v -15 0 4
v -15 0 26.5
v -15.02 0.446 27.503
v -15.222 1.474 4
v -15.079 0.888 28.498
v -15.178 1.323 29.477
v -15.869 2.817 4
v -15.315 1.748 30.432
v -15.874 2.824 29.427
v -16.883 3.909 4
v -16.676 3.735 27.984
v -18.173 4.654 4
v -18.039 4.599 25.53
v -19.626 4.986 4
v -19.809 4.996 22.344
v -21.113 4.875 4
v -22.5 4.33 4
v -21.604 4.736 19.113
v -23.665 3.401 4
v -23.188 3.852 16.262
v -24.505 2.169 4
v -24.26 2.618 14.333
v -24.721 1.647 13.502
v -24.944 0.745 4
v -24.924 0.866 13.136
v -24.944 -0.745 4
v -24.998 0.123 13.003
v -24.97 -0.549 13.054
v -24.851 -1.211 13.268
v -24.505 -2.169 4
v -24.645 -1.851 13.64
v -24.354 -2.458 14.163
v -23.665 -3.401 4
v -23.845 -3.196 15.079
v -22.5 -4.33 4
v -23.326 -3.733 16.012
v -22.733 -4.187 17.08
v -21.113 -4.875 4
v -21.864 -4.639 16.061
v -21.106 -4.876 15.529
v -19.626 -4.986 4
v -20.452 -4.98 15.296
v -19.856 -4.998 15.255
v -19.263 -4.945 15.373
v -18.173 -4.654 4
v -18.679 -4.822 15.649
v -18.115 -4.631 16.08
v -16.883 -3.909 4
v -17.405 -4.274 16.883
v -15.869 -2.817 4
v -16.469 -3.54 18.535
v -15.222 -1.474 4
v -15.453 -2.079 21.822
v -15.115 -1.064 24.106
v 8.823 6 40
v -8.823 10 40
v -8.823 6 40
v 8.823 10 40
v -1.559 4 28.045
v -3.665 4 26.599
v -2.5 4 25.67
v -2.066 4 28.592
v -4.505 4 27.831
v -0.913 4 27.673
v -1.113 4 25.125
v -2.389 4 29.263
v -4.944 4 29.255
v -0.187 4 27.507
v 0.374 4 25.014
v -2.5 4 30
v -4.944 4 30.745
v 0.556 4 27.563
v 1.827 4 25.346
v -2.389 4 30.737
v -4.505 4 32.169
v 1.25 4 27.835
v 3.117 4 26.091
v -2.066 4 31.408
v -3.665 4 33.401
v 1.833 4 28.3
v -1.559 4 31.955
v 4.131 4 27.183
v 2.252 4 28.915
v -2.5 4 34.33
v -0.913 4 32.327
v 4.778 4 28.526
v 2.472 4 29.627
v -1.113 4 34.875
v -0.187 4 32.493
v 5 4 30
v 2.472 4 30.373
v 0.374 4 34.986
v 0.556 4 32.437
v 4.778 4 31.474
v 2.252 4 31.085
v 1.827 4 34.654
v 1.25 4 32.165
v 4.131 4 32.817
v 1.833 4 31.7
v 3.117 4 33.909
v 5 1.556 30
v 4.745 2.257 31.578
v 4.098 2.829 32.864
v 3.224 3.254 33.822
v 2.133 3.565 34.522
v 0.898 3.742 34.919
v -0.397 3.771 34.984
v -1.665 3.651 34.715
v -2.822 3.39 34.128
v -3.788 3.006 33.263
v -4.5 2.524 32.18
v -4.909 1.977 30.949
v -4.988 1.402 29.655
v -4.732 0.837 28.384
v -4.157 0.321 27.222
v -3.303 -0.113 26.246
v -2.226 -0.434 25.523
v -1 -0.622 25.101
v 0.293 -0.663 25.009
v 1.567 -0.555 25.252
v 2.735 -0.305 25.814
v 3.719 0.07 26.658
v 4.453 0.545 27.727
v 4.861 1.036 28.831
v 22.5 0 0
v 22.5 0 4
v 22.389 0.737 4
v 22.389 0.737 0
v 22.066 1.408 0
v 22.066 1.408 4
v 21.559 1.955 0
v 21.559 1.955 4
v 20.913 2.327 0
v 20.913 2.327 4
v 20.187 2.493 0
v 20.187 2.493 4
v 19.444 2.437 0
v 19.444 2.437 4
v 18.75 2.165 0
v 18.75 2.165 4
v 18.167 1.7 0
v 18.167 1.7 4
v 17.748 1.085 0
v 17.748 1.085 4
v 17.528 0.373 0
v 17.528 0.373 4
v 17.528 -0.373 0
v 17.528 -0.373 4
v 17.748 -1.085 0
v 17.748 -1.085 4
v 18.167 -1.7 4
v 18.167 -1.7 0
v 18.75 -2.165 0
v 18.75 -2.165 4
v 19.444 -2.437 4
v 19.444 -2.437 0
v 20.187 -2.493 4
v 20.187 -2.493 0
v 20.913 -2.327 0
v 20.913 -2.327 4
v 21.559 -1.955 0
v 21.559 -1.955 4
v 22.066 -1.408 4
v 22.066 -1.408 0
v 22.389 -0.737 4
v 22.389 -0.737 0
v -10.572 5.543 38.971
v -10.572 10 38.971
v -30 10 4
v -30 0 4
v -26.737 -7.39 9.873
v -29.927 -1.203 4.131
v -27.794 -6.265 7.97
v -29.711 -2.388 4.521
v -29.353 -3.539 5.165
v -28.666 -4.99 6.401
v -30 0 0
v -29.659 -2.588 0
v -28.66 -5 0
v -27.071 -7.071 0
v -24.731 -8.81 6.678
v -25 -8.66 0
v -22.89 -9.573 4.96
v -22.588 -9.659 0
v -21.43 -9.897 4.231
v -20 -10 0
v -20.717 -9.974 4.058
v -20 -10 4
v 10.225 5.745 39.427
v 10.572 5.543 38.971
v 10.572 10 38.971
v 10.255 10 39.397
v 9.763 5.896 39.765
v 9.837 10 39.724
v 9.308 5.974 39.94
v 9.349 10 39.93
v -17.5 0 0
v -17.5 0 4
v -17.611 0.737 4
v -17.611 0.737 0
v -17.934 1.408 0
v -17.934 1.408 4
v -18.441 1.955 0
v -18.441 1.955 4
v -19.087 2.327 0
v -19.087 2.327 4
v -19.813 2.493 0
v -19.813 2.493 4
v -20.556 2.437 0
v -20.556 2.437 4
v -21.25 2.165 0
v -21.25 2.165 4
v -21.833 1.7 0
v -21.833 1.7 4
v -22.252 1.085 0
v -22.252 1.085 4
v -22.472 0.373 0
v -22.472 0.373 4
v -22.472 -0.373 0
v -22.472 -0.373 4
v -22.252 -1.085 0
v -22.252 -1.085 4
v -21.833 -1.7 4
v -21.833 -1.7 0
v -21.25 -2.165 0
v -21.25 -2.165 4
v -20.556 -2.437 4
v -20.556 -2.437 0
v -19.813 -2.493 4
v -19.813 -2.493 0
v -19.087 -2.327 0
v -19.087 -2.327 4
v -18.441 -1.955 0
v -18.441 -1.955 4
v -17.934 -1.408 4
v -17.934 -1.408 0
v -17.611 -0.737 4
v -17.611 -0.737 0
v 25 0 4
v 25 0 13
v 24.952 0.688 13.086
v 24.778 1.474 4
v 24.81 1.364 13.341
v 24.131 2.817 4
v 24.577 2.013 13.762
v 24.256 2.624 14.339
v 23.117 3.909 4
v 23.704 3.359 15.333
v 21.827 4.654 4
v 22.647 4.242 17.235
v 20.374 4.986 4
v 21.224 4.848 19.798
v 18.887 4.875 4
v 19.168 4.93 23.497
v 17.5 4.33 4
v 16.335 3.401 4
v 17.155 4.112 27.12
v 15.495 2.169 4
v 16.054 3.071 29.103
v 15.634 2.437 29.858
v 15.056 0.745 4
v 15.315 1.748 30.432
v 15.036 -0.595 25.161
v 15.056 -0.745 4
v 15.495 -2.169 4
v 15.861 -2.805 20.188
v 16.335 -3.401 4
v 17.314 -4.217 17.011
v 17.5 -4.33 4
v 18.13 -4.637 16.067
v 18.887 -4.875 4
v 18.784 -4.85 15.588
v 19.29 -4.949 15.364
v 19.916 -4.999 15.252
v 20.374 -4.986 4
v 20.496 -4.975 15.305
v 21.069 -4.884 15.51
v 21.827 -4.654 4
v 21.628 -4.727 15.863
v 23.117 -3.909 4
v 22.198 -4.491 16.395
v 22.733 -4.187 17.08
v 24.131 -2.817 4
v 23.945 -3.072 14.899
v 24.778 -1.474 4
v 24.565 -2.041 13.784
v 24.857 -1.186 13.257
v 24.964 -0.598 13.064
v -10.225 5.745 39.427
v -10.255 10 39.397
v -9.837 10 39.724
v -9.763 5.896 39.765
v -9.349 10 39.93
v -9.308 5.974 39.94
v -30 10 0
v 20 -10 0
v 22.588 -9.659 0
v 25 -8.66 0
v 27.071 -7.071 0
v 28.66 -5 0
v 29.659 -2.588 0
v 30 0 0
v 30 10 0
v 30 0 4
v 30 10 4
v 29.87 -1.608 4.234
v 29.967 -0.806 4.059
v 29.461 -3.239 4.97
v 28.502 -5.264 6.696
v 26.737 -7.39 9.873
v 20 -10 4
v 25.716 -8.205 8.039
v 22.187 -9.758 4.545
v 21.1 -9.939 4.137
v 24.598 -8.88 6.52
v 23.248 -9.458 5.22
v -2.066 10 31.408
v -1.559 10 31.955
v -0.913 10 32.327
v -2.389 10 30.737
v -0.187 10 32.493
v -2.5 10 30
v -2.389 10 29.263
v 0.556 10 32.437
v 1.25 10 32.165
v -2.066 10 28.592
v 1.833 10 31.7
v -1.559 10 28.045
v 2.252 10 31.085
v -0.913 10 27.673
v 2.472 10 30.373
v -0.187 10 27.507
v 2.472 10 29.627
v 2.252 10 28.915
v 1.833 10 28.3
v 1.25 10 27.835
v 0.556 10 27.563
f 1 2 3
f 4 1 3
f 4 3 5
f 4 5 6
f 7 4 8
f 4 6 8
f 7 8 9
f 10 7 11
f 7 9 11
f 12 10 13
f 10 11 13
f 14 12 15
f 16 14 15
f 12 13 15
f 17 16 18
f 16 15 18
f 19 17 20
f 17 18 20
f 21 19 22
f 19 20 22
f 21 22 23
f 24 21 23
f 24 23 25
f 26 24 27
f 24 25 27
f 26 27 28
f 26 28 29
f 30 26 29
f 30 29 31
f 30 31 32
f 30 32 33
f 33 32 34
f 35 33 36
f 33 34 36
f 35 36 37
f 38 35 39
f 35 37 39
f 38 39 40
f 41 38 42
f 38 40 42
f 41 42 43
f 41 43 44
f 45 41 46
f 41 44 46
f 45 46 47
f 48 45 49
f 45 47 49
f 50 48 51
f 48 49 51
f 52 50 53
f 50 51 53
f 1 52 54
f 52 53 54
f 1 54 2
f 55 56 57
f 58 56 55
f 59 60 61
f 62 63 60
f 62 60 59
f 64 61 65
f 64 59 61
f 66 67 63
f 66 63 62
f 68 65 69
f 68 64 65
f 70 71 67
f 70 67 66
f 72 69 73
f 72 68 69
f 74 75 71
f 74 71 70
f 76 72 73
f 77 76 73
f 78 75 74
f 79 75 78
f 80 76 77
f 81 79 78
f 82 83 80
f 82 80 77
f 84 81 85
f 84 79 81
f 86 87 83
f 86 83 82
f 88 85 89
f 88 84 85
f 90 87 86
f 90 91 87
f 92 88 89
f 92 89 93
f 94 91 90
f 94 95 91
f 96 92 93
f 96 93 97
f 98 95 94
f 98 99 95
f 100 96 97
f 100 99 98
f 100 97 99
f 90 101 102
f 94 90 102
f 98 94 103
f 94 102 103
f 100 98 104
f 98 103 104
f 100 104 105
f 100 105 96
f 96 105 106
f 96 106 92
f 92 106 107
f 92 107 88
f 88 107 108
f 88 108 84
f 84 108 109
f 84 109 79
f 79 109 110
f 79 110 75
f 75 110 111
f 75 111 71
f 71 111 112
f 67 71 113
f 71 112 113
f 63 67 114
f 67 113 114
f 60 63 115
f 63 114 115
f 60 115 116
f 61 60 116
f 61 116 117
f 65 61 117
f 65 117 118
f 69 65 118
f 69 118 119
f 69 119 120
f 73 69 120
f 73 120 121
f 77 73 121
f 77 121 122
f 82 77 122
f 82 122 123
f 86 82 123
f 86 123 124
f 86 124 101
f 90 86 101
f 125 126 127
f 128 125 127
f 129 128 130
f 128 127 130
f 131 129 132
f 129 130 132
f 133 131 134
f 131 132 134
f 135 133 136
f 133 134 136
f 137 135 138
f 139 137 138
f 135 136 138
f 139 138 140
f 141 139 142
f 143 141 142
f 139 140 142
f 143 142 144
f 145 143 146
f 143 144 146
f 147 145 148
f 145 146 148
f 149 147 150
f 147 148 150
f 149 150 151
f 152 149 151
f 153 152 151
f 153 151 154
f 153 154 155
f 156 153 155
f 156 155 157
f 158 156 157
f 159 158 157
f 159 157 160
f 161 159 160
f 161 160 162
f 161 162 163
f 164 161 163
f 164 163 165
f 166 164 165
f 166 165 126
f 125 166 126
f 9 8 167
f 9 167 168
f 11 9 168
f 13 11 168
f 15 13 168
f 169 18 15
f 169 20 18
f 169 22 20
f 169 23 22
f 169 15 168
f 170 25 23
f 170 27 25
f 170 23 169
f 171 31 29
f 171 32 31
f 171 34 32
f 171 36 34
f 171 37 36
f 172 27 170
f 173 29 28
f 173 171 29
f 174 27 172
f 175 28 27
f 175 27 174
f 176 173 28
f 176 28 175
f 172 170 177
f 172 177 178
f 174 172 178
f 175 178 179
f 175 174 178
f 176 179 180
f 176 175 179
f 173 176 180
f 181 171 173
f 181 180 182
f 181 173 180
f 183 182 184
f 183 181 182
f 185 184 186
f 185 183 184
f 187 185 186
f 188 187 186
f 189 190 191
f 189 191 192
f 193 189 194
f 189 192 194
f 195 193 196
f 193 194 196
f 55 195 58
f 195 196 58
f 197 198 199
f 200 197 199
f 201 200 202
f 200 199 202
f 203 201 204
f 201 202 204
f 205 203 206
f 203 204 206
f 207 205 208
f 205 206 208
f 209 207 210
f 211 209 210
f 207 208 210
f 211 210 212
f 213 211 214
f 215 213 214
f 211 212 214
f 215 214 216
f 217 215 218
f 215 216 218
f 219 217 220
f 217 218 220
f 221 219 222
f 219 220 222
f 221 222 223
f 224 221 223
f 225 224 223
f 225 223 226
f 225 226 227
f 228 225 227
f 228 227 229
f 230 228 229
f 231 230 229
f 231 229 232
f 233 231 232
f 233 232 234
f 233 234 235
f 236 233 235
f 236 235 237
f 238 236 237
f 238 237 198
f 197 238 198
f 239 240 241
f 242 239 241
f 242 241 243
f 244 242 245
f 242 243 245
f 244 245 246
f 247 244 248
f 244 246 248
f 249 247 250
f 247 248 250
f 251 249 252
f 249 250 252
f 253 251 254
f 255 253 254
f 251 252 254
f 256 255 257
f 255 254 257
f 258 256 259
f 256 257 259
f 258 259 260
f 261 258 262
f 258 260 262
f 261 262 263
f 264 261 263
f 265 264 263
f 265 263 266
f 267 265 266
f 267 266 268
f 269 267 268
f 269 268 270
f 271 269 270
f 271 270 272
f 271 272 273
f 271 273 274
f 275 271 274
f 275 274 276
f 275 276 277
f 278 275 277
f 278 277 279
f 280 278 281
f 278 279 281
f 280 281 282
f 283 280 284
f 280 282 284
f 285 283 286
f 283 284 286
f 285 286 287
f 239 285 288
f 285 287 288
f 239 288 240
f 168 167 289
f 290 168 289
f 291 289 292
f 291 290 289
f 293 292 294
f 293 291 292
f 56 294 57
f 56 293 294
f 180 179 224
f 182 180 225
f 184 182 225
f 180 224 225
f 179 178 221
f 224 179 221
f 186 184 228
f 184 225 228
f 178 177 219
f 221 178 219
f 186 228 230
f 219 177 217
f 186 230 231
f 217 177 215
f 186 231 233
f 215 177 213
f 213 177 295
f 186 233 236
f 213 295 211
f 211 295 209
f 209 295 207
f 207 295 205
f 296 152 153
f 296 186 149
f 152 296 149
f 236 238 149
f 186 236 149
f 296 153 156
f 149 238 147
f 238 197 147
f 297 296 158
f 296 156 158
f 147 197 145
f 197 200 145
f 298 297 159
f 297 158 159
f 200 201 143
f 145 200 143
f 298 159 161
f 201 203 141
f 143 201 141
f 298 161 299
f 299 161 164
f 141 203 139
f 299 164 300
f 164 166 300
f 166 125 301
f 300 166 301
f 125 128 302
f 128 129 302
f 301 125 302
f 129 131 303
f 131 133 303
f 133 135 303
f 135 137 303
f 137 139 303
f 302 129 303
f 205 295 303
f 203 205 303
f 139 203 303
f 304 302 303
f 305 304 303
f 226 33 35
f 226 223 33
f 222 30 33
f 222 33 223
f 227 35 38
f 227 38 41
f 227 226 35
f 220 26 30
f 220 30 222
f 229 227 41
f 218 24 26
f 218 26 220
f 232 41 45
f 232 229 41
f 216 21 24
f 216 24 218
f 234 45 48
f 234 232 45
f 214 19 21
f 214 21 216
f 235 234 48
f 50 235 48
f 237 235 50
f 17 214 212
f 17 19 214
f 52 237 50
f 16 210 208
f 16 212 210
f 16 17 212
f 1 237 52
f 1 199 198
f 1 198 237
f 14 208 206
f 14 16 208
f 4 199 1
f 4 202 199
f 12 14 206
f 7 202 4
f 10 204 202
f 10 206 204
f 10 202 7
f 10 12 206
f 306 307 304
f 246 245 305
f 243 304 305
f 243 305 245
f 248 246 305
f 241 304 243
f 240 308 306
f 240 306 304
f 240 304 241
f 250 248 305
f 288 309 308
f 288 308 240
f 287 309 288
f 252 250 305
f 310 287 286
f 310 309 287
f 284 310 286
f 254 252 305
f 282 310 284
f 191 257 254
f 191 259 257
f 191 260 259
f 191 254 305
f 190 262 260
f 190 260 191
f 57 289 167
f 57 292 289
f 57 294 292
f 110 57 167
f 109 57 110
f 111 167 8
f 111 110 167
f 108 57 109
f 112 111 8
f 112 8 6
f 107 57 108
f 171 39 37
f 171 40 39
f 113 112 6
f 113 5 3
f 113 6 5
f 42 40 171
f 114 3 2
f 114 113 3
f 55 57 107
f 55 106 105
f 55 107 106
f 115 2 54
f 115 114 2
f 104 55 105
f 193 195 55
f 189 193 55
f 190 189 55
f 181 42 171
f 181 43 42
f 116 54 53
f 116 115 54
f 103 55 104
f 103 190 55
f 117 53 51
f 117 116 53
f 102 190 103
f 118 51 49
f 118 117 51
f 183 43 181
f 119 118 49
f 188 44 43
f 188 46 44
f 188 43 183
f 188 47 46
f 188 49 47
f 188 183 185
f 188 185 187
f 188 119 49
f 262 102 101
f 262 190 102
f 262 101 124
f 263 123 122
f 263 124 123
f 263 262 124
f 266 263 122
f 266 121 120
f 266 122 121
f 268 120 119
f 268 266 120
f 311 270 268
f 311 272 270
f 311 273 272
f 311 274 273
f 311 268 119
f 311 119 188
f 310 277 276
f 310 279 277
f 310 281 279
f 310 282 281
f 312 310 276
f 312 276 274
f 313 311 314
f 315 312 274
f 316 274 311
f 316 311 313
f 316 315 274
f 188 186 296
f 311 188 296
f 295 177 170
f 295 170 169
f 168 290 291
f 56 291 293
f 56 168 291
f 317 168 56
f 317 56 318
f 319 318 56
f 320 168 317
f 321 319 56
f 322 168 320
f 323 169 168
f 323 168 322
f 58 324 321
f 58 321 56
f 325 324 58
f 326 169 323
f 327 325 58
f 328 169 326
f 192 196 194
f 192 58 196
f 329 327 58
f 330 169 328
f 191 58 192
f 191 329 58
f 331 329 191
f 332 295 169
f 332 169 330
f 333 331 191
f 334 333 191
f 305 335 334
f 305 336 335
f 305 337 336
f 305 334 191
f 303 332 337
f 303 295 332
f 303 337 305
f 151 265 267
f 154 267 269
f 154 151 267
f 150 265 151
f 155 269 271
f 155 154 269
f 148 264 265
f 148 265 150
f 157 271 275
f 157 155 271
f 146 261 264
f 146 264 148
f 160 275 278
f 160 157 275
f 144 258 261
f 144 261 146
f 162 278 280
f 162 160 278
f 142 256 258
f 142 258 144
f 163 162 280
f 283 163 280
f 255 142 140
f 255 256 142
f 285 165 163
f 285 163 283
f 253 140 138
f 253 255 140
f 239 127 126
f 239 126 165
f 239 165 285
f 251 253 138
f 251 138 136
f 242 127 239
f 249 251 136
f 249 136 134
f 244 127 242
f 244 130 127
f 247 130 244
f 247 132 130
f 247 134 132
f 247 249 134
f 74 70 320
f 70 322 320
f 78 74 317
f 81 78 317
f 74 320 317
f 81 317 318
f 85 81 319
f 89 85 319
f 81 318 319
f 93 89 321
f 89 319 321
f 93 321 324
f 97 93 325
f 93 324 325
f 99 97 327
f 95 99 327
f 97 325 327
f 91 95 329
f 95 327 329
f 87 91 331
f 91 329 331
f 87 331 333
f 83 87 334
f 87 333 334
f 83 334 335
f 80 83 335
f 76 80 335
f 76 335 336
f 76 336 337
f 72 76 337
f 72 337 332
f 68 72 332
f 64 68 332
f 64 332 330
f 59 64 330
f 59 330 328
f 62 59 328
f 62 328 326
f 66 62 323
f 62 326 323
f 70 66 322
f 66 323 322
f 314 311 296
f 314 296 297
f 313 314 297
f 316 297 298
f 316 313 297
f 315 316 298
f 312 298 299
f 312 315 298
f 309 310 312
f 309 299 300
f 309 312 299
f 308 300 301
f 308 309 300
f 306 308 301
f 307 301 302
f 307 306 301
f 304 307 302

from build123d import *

# Parameters (mm, degrees)
SKETCH_W         = 60
SKETCH_H         = 20
PAD_DEPTH        = 40
POCKET_DEPTH     = 20.001
HOLE_D           = 5
HOLE_DEPTH       = 25
HOLE_CBORE_D     = 10
HOLE_CBORE_DEPTH = 14
POCKET001_DEPTH  = 60.001
SKETCH004_R      = 5
HOLE001_DEPTH    = 36
SKETCH005_R      = 2.5
POCKET002_DEPTH  = 5
FILLET_R         = 10
FILLET001_R      = 2


with BuildPart() as part:
    # Sketch → Pad (new body)
    with BuildSketch(Plane.XY):
        Rectangle(SKETCH_W, SKETCH_H)
    extrude(amount=PAD_DEPTH)

    # Sketch001 (on Face3 of Pad) → Pocket (cut, through all)
    with BuildSketch(Plane.XZ.offset(10)):
        Polygon((30, 40), (30, 4), (10, 40), align=None)
        Polygon((-30, 4), (-30, 40), (-10, 40), align=None)
    extrude(amount=-POCKET_DEPTH, mode=Mode.SUBTRACT)

    # Hole
    with Locations(Plane.XZ.offset(10)):
        with Locations((0, 30)):
            CounterBoreHole(HOLE_D / 2, HOLE_CBORE_D / 2, HOLE_CBORE_DEPTH, depth=HOLE_DEPTH)

    # Sketch003 (on Face4 of Hole) → Pocket001 (cut, through all)
    with BuildSketch(Plane.YZ.offset(30)):
        Polygon((-10, 4), (-10, 40), (6, 40), align=None)
    extrude(amount=-POCKET001_DEPTH, mode=Mode.SUBTRACT)

    # Sketch004 (on Face7 of Pocket001) → Hole001 (cut)
    with BuildSketch(Plane.XY.offset(40)):
        with Locations((-20, 0)):
            Circle(SKETCH004_R)
        with Locations((20, 0)):
            Circle(SKETCH004_R)
    extrude(amount=-HOLE001_DEPTH, mode=Mode.SUBTRACT)

    # Sketch005 (on Face15 of Hole001) → Pocket002 (cut)
    with BuildSketch(Plane.XY.offset(4)):
        with Locations((-20, 0)):
            Circle(SKETCH005_R)
        with Locations((20, 0)):
            Circle(SKETCH005_R)
    extrude(amount=-POCKET002_DEPTH, mode=Mode.SUBTRACT)

    # Fillet
    fillet_edges = [part.edges().sort_by_distance(p)[0] for p in [
        (30, -10, 2),
        (-30, -10, 2),
    ]]
    fillet(fillet_edges, radius=FILLET_R)

    # Fillet001
    fillet001_edges = [part.edges().sort_by_distance(p)[0] for p in [
        (10, 8, 40),
        (-10, 8, 40),
    ]]
    fillet(fillet001_edges, radius=FILLET001_R)


solid = part.part
